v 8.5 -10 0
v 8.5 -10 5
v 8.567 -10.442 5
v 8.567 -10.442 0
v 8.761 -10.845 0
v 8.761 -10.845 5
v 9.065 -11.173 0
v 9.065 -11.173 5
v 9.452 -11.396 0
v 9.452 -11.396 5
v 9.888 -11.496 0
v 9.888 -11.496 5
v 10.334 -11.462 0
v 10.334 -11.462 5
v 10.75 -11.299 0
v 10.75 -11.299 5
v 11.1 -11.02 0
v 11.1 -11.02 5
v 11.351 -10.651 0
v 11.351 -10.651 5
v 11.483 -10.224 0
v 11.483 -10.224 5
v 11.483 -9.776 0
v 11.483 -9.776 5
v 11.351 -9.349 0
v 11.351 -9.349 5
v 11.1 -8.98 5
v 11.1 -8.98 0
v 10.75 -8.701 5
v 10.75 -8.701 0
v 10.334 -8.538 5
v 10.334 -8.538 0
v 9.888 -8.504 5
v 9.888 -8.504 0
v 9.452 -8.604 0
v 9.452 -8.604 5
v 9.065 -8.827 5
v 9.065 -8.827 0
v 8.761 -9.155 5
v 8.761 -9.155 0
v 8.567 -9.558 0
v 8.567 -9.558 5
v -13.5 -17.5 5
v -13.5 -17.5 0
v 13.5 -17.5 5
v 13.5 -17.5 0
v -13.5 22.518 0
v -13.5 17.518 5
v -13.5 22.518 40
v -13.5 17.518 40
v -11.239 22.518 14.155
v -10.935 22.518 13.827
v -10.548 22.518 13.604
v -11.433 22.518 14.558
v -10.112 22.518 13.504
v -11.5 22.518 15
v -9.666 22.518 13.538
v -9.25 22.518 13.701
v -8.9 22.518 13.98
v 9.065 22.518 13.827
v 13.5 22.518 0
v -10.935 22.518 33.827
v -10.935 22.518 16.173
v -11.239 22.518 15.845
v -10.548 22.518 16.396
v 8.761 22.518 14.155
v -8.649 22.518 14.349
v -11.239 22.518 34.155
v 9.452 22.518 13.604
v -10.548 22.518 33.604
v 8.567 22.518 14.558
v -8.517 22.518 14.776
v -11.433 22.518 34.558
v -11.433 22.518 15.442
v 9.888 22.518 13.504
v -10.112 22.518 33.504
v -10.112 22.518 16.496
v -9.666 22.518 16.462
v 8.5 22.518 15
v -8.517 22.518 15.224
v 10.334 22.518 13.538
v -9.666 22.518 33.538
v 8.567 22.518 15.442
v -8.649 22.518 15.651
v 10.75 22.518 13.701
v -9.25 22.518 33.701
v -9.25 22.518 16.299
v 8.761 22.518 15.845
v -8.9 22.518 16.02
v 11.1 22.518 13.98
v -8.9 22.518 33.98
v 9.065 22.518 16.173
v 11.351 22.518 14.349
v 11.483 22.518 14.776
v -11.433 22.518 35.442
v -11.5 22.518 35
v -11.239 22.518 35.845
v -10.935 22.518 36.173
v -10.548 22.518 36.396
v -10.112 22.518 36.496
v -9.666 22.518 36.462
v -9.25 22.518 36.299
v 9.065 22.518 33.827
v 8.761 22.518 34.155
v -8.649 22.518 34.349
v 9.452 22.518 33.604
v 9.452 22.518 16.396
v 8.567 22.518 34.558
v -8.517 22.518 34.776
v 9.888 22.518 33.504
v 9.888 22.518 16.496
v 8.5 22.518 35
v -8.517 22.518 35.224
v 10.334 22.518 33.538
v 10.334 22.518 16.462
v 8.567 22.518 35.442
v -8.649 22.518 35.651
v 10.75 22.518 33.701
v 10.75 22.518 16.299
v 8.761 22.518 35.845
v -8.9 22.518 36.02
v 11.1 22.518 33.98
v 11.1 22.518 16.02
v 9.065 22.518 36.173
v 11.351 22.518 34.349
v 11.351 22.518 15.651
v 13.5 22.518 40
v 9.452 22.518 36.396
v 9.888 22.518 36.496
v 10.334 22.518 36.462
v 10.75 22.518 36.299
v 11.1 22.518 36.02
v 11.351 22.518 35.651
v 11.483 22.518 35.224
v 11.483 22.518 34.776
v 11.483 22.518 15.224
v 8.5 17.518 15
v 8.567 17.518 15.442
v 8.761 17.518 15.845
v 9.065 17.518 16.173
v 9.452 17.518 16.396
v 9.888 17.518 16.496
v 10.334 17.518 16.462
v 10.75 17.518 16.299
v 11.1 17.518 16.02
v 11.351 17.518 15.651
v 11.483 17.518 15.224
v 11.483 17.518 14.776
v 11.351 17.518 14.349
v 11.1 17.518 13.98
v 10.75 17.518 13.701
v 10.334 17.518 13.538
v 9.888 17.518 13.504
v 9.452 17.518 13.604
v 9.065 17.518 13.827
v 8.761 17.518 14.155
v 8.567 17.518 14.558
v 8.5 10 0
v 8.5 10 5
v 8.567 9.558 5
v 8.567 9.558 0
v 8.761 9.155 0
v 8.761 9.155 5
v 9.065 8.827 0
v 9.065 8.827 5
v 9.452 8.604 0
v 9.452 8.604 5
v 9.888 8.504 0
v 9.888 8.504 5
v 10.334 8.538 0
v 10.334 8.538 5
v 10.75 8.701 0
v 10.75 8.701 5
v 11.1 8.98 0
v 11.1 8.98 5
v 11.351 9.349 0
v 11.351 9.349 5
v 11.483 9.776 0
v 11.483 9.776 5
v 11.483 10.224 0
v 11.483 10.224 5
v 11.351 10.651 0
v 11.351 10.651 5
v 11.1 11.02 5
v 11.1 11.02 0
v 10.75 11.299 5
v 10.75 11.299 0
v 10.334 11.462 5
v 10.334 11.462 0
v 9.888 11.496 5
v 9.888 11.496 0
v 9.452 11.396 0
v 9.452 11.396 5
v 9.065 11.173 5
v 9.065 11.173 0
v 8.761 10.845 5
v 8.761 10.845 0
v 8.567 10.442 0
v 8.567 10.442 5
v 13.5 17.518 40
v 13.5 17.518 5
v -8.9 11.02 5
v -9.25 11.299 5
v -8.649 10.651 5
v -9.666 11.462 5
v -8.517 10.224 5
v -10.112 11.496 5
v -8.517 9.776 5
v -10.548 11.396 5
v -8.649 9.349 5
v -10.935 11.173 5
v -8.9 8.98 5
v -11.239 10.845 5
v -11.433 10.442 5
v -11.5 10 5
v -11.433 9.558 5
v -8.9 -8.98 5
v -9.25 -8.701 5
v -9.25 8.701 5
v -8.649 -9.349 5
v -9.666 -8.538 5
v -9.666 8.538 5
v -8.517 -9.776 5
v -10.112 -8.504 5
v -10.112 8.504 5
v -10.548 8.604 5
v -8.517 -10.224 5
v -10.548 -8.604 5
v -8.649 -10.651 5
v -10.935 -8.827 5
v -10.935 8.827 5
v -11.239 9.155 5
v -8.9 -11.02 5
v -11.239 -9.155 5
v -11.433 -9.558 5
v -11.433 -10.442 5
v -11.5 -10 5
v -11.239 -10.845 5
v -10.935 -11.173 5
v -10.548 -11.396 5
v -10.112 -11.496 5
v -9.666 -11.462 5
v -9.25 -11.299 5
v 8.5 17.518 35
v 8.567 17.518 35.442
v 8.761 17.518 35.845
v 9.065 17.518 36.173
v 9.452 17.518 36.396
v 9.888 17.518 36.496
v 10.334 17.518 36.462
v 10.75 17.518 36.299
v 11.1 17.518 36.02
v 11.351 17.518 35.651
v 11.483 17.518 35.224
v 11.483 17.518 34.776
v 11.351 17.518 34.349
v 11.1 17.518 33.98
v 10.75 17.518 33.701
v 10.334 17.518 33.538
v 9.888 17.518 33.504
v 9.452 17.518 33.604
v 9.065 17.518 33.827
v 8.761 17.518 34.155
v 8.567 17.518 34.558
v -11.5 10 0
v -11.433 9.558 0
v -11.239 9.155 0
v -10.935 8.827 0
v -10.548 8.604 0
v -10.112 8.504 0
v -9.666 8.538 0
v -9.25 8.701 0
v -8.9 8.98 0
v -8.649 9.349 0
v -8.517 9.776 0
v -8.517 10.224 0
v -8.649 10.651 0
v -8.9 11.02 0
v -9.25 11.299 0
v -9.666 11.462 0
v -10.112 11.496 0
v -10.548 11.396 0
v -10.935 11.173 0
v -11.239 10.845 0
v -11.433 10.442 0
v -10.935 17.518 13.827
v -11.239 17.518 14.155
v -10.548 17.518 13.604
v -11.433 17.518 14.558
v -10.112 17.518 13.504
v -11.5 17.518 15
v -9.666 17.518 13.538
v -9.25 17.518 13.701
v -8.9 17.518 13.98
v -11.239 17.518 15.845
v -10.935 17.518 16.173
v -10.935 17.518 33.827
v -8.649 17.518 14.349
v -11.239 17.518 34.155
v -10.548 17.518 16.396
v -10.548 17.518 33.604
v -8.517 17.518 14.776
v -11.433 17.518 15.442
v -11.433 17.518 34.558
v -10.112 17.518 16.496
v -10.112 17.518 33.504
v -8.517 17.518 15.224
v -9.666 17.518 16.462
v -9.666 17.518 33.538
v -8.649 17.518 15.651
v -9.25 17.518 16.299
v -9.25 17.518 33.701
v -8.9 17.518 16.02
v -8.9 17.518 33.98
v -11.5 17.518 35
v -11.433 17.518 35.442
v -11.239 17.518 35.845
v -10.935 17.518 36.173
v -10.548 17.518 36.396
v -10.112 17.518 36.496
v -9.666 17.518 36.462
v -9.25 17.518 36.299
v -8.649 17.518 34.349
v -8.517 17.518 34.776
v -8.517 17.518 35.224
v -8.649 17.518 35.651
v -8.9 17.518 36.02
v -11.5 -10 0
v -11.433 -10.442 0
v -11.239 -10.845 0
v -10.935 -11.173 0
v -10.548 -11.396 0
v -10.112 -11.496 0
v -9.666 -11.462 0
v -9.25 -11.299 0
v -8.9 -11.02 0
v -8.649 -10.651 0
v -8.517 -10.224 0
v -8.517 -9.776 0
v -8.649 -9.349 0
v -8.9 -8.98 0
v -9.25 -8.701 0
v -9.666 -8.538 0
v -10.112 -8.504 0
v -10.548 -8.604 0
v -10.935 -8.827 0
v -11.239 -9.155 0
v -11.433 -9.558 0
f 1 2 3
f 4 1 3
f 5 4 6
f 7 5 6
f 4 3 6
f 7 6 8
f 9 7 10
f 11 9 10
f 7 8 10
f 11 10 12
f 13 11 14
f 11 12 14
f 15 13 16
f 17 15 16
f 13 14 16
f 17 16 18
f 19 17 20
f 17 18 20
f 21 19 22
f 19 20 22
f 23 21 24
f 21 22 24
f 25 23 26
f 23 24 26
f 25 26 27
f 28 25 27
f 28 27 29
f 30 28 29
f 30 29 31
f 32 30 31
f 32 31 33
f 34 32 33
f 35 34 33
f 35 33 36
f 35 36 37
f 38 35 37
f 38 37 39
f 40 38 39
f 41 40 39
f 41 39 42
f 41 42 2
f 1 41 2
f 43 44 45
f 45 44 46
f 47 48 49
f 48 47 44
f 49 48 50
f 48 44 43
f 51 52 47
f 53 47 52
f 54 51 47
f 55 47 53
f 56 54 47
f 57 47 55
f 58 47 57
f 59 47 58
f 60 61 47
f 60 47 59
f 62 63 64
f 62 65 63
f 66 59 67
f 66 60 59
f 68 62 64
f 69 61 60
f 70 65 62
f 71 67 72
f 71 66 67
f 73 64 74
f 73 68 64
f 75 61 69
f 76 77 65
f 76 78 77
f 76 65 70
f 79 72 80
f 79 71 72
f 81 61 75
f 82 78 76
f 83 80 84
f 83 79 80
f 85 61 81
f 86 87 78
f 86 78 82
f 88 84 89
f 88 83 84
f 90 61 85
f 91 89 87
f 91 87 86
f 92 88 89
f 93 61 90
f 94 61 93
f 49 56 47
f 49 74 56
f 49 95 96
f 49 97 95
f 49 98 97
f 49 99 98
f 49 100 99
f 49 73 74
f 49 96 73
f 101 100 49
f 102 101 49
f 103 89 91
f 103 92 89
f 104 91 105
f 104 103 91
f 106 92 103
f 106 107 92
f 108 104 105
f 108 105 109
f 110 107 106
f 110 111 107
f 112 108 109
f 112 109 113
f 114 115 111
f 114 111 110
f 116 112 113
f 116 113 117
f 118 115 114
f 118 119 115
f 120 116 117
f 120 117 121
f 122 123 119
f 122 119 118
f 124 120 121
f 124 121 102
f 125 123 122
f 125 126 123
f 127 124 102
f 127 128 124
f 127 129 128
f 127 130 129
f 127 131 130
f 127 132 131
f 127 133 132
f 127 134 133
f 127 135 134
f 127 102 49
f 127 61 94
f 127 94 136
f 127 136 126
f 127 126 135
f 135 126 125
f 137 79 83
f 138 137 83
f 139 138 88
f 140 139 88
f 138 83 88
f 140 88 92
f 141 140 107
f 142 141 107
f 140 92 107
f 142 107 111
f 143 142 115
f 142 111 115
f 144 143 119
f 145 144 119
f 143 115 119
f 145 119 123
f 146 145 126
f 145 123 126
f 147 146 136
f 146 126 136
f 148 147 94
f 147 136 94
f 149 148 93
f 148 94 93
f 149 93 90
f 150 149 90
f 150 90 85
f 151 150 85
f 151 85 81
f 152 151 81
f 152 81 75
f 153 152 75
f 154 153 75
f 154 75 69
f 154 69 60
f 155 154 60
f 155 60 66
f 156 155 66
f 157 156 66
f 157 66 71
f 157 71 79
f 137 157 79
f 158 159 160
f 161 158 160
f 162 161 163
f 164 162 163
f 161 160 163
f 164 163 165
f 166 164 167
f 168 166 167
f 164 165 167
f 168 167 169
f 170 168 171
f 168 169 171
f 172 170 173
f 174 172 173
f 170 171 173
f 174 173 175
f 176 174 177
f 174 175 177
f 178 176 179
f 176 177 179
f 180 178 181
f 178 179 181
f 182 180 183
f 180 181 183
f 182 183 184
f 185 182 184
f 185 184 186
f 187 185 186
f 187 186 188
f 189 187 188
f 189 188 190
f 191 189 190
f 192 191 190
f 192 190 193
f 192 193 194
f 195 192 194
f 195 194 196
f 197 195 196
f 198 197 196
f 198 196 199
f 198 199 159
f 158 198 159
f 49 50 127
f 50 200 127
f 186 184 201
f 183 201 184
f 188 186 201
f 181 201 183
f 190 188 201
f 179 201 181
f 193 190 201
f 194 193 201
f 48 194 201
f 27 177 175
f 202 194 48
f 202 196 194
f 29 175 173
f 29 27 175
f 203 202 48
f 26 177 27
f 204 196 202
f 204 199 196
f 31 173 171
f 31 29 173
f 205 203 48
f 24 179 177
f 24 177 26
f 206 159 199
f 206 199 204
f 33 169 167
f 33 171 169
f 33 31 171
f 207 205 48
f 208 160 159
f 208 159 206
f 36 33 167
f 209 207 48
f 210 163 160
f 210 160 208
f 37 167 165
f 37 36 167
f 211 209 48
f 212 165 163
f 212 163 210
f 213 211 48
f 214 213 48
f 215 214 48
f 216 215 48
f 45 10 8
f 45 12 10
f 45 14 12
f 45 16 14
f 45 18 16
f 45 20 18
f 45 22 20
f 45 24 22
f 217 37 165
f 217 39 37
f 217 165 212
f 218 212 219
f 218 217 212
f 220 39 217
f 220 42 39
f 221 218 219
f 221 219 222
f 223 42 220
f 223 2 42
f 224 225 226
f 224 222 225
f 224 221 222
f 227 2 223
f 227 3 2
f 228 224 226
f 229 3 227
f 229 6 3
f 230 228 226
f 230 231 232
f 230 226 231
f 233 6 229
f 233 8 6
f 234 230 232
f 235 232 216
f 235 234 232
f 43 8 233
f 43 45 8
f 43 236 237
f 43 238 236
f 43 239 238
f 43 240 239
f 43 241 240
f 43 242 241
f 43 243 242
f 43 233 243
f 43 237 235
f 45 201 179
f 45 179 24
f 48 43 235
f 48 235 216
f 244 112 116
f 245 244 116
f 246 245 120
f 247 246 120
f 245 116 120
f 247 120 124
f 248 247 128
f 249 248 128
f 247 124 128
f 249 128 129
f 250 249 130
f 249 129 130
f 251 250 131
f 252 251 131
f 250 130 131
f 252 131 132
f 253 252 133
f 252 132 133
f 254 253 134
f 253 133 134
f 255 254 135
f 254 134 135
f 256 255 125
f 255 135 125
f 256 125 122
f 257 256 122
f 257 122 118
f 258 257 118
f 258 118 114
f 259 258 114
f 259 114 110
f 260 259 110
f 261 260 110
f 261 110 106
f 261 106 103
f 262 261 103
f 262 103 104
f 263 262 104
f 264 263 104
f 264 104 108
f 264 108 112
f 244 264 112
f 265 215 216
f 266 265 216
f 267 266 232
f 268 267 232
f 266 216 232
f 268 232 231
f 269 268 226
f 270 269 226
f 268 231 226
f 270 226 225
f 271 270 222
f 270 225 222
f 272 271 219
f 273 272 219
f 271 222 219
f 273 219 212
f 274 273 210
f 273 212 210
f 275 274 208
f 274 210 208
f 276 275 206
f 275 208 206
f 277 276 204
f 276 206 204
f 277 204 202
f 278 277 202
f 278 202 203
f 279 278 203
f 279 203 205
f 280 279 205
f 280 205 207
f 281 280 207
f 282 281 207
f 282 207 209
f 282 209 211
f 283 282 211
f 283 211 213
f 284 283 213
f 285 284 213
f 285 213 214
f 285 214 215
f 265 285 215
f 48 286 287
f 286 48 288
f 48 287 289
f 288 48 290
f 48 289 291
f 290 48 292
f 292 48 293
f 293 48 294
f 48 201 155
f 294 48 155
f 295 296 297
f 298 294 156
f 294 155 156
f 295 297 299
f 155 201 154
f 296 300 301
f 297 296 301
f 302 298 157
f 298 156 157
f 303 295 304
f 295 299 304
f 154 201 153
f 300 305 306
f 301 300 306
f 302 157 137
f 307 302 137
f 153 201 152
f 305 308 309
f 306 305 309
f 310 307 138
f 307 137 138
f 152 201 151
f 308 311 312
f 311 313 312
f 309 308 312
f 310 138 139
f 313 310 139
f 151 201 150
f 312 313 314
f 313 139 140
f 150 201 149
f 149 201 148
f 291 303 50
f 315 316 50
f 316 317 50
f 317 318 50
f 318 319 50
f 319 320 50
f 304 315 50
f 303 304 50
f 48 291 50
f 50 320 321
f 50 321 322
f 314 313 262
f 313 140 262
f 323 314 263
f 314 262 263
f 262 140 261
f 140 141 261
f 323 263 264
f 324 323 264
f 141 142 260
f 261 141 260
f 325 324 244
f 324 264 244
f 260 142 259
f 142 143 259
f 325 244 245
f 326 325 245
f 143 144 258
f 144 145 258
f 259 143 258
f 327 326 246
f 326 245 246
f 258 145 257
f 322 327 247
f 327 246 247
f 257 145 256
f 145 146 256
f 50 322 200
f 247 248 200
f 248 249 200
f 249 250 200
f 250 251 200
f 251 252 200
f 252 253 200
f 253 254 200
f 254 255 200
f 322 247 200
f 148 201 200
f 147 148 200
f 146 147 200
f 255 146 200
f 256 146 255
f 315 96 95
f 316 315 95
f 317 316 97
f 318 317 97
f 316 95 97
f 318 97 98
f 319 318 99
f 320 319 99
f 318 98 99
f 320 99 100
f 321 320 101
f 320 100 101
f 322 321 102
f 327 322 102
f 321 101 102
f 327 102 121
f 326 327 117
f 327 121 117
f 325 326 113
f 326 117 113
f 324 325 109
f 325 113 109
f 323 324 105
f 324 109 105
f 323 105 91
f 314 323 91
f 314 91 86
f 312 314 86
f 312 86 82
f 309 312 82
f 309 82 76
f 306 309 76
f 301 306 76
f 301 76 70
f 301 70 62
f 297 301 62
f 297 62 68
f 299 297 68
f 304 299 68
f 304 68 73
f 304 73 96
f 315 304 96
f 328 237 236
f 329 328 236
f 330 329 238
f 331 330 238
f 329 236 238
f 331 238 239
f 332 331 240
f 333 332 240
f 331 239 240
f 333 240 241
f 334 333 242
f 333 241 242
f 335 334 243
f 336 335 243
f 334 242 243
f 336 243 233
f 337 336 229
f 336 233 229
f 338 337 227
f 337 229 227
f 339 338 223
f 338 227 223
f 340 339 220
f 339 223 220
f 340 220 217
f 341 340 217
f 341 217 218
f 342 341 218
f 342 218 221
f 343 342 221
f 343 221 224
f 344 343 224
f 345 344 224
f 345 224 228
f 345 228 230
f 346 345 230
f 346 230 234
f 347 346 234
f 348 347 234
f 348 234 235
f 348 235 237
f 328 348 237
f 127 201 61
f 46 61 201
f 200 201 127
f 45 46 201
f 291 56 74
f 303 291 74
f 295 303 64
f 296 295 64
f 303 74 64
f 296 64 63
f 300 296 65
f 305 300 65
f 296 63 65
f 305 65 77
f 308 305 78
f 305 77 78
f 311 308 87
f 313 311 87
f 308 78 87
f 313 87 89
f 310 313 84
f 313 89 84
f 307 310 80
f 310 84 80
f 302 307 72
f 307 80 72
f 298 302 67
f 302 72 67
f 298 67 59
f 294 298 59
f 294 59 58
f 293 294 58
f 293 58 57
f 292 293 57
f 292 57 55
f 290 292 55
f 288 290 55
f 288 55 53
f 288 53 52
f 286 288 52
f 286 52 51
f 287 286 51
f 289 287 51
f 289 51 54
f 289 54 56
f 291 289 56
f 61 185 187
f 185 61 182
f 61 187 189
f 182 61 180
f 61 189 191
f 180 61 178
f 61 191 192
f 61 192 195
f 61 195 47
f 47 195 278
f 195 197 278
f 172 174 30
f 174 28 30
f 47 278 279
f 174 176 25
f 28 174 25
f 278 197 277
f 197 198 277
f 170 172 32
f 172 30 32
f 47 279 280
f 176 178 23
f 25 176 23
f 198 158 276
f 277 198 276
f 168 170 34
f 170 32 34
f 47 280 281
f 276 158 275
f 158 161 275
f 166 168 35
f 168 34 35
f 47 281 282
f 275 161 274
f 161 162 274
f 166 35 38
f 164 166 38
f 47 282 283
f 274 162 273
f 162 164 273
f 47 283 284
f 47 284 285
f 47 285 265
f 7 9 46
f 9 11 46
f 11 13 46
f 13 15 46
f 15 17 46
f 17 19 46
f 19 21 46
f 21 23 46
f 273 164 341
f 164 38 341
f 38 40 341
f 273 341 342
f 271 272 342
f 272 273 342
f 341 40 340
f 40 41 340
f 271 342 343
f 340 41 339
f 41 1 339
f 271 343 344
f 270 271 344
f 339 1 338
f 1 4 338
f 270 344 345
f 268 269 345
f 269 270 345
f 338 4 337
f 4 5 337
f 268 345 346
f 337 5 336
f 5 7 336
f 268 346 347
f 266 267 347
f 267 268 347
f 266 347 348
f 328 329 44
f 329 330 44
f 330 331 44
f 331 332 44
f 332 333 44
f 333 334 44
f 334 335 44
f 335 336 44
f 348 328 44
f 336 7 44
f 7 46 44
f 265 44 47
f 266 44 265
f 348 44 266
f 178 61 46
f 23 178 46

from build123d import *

# Parameters (mm, degrees)
F0_W      = 27
F0_H      = 35
F1_DEPTH  = 5
F2_D      = 3
F1_FACE_W = 27
F1_FACE_H = 5
F3_DEPTH  = 5
F4_W      = 5
F4_H      = 40
F5_DEPTH  = 13.5
F7_D      = 3


with BuildPart() as f1:
    # F0 (on Top) → F1 (new body)
    with BuildSketch(Plane.XY):
        Rectangle(F0_W, F0_H)
    extrude(amount=F1_DEPTH)

    # F2 (through all)
    with Locations(Plane(origin=(0, 0, 0), x_dir=(1, 0, 0), z_dir=(0, 0, -1))):
        with Locations((-10, 10), (10, 10), (10, -10), (-10, -10)):
            Hole(F2_D / 2)

    # F1_face (on face) → F3 (join)
    with BuildSketch(Plane(origin=(0, 17.5, 2.5), x_dir=(-1, 0, 0), z_dir=(0, 1, 0))):
        Rectangle(F1_FACE_W, F1_FACE_H)
    extrude(amount=F3_DEPTH)

    # F4 (on Right) → F5 (join, symmetric)
    with BuildSketch(Plane.YZ):
        with Locations((20.017813, 20)):
            Rectangle(F4_W, F4_H)
    extrude(amount=F5_DEPTH, both=True)

    # F7 (through all)
    with Locations(Plane.XZ):
        with Locations((-10, 35), (10, 35), (10, 15), (-10, 15)):
            Hole(F7_D / 2)


solid = f1.part
